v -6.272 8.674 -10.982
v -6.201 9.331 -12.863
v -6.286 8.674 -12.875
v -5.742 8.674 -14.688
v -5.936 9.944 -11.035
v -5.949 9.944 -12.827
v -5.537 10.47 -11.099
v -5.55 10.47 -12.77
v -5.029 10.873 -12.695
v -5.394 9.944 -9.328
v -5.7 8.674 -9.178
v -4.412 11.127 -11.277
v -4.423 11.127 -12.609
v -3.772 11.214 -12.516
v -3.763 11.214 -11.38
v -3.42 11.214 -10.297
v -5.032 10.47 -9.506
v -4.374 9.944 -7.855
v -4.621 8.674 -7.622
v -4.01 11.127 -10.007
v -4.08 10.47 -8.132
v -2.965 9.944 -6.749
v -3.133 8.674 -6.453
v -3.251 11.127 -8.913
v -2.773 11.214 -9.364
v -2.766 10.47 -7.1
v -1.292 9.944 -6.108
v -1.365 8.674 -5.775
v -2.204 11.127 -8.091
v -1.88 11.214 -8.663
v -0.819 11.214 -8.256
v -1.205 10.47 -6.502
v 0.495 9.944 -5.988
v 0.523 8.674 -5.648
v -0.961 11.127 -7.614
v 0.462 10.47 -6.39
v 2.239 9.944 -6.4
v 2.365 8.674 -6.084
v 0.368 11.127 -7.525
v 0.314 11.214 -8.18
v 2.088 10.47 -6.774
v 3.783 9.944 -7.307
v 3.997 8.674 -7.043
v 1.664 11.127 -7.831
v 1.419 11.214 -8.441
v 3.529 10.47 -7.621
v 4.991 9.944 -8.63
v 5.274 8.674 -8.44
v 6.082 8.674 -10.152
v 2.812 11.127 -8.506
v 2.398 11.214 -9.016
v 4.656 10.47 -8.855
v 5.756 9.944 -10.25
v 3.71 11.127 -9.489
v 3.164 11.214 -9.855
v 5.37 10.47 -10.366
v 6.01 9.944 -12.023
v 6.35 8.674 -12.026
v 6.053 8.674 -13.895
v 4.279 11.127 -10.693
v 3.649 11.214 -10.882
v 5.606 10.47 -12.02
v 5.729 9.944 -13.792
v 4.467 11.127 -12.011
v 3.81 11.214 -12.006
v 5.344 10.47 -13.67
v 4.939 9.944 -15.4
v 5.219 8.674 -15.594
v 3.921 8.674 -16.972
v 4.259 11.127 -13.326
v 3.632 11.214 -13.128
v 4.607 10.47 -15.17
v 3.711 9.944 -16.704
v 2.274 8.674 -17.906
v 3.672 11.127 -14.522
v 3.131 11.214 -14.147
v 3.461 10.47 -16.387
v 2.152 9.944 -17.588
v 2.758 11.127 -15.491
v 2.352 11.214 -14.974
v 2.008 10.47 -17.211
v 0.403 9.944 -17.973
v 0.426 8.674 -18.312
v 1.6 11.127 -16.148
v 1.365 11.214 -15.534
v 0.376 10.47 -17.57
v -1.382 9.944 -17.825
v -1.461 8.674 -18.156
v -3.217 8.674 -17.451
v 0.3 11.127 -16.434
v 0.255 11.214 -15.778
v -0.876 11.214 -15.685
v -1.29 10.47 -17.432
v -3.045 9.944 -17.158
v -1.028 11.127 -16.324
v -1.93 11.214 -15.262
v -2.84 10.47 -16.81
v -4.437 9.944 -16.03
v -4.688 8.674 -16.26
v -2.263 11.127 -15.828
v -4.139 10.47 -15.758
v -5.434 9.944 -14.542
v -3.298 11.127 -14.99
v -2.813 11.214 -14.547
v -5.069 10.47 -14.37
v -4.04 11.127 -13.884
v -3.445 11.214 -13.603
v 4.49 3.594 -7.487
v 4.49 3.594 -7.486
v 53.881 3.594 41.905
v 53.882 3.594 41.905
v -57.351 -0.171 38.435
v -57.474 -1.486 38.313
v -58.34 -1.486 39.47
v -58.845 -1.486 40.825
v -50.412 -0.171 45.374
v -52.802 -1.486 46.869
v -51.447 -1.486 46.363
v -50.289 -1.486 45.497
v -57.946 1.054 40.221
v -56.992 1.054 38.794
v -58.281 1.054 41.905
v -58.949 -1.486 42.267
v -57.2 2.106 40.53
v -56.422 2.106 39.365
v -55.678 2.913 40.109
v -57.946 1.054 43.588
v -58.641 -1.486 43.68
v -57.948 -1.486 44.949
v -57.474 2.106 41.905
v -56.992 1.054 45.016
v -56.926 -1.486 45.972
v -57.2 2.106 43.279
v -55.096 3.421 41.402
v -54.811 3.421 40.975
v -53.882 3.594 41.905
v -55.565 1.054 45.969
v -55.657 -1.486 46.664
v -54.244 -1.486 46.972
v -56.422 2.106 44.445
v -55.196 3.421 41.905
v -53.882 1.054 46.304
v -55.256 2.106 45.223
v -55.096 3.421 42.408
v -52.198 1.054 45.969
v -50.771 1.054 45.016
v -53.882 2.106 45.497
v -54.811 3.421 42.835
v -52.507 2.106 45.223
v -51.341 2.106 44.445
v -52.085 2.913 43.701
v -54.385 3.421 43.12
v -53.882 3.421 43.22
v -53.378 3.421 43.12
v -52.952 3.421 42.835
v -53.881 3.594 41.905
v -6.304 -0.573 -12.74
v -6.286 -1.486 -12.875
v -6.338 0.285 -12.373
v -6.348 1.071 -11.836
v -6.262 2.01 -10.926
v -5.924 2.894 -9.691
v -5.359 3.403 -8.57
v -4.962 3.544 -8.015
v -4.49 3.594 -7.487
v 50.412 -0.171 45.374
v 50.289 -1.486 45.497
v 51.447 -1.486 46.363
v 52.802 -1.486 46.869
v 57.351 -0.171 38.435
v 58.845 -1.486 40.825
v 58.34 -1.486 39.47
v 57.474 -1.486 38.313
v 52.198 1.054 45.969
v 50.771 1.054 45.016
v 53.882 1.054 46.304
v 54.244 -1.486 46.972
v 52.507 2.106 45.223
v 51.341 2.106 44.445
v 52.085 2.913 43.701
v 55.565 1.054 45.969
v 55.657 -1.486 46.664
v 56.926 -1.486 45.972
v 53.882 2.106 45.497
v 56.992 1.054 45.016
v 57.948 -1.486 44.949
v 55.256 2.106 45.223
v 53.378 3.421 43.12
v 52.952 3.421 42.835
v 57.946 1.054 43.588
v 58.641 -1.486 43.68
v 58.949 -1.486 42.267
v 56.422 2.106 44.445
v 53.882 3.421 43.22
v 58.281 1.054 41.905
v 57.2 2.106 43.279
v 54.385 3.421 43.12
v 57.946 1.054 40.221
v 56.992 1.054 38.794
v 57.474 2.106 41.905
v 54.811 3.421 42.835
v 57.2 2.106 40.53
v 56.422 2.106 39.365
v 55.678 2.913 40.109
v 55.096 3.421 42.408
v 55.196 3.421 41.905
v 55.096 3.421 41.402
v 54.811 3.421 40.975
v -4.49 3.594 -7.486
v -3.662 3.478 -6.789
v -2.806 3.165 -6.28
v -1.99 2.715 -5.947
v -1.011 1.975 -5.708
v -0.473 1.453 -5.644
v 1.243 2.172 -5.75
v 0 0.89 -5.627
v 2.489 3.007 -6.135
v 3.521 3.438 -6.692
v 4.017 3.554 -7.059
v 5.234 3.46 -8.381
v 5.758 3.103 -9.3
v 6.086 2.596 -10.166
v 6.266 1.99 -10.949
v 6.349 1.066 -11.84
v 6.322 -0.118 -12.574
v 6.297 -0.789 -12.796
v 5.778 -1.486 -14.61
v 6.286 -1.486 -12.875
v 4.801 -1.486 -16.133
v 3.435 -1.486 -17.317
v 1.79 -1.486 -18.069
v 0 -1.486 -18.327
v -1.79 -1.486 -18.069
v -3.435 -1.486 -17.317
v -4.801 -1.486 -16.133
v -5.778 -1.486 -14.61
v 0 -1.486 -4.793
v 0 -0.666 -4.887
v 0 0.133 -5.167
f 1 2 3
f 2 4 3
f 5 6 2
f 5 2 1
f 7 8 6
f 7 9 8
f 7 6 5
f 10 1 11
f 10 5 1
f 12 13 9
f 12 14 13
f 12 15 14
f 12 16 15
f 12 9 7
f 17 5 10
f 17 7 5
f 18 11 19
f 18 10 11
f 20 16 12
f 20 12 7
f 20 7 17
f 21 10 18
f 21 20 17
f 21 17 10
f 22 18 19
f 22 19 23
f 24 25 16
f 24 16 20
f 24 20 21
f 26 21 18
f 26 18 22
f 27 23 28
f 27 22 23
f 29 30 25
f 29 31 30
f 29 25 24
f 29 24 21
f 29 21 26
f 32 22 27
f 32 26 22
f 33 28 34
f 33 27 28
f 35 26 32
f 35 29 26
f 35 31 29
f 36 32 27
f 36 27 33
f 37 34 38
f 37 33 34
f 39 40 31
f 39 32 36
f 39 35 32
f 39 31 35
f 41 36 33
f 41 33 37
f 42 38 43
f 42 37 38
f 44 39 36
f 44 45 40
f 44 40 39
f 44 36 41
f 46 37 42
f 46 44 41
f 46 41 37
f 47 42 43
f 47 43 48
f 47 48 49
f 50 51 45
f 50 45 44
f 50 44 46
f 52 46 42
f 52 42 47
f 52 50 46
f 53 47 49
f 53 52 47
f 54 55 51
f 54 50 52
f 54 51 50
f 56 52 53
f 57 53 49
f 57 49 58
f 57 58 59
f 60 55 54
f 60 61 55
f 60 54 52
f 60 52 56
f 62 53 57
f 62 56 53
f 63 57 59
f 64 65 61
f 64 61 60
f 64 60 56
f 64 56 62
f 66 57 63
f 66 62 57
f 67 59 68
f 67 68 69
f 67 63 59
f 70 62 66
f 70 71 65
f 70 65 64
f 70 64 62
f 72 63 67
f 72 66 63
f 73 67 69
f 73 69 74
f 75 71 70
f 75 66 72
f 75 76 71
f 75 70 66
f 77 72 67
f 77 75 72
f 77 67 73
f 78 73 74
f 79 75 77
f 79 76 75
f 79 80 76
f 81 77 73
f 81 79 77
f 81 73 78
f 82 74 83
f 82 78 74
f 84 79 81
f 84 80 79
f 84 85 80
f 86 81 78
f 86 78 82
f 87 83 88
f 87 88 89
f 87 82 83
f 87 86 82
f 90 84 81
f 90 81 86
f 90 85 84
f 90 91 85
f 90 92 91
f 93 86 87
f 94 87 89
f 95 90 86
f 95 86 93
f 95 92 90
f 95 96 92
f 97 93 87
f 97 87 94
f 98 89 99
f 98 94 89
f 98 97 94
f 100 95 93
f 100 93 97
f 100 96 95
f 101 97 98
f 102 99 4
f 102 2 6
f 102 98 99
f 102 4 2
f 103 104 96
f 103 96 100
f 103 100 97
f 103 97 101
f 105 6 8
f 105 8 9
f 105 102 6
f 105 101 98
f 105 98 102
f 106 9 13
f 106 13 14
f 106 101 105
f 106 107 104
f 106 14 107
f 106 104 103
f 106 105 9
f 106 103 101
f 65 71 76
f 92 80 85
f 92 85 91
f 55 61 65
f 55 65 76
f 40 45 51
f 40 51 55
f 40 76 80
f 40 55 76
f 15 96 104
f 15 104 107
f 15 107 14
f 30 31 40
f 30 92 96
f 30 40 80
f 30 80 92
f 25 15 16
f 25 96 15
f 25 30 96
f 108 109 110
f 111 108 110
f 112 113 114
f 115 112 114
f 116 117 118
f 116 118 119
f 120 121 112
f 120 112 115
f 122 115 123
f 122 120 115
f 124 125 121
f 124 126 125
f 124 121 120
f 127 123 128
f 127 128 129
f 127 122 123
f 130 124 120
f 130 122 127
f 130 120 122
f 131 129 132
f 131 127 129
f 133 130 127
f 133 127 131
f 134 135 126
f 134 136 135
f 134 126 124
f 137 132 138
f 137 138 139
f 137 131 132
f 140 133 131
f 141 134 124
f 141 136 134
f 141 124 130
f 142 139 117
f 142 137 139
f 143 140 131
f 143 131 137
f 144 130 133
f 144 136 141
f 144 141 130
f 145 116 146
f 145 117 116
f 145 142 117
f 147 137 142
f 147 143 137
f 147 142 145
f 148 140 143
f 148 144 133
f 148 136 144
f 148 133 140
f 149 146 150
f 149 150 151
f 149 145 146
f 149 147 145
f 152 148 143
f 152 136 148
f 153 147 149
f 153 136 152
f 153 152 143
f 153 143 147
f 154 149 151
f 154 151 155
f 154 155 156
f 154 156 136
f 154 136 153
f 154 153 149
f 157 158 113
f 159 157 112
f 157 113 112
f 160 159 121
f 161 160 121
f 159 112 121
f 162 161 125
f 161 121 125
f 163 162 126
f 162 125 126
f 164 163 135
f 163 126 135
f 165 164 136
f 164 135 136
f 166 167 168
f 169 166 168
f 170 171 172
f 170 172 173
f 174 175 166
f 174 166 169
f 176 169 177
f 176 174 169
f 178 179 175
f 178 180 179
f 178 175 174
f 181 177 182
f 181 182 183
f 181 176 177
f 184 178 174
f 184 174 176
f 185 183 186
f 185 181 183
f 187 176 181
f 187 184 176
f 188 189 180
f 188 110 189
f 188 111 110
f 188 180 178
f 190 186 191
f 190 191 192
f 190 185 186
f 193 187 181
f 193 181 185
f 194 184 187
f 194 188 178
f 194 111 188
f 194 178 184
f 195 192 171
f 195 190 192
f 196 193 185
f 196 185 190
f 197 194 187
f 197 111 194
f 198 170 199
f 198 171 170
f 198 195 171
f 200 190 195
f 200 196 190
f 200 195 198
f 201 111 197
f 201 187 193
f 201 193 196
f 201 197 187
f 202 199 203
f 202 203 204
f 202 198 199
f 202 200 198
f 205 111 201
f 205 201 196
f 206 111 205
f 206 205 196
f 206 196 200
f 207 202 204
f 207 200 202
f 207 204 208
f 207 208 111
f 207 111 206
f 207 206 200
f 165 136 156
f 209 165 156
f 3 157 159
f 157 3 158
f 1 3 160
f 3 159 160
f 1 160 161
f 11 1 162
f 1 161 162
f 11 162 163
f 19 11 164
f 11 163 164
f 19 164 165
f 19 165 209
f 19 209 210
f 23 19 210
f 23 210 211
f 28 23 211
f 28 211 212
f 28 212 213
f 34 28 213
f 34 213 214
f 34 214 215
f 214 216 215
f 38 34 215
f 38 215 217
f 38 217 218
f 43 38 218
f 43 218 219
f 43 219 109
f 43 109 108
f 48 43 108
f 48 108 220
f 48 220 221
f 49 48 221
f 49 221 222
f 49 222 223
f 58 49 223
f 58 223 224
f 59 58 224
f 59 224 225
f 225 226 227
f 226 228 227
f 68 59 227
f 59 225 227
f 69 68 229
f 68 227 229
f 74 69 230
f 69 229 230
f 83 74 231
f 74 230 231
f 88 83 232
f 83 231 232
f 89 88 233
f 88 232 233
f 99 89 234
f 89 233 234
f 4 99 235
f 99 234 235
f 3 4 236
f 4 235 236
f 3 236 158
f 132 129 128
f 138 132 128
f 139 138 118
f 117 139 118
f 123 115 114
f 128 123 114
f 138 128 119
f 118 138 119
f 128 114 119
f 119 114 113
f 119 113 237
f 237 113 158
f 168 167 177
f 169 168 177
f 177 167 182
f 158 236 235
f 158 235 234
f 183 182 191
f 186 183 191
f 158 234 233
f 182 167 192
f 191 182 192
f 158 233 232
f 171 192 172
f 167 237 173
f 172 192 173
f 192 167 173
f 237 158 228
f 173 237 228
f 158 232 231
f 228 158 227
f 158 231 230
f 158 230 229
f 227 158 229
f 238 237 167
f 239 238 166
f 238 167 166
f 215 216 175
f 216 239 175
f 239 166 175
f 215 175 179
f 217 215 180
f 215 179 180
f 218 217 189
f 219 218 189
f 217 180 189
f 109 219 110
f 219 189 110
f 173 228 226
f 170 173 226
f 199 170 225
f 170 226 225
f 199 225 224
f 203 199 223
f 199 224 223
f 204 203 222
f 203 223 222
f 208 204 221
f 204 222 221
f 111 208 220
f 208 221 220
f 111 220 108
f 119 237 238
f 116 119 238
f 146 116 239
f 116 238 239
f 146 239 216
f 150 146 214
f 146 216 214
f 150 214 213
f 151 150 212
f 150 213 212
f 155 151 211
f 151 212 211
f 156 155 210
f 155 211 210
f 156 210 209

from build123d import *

# Parameters (mm, degrees)
BOSS_EXTRUDE1_DEPTH = 2.54
FILLET4_R           = 2.54
SKETCH2_R           = 3.175
BOSS_EXTRUDE2_DEPTH = 6.35
FILLET5_R           = 1.27
SCALE1_SCALE        = 2


with BuildPart() as part:
    # Sketch1 → Boss-Extrude1 (new body)
    with BuildSketch(Plane(origin=(0, 0, 0), x_dir=(1, 0, 0), z_dir=(0, 1, 0))):
        with BuildLine():
            ThreePointArc((1.796051224, -1.796051224), (2.54, 0), (1.796051224, 1.796051224))
            ThreePointArc((1.796051224, 1.796051224), (0, 2.54), (-1.796051224, 1.796051224))
            ThreePointArc((-1.796051224, 1.796051224), (-2.54, 0), (-1.796051224, -1.796051224))
            Line((-1.796051224, -1.796051224), (0, -3.592102448))
            Line((0, -3.592102448), (1.796051224, -1.796051224))
        make_face()
        with BuildLine():
            Line((28.736819587, -25.144717139), (1.796051224, 1.796051224))
            ThreePointArc((1.796051224, 1.796051224), (2.54, 0), (1.796051224, -1.796051224))
            Line((1.796051224, -1.796051224), (0, -3.592102448))
            Line((0, -3.592102448), (25.144717139, -28.736819587))
            ThreePointArc((25.144717139, -28.736819587), (28.736819587, -28.736819587), (28.736819587, -25.144717139))
        make_face()
        with BuildLine():
            ThreePointArc((-1.796051224, -1.796051224), (-2.54, 0), (-1.796051224, 1.796051224))
            Line((-1.796051224, 1.796051224), (-28.736819587, -25.144717139))
            ThreePointArc((-28.736819587, -25.144717139), (-28.736819587, -28.736819587), (-25.144717139, -28.736819587))
            Line((-25.144717139, -28.736819587), (0, -3.592102448))
            Line((0, -3.592102448), (-1.796051224, -1.796051224))
        make_face()
    extrude(amount=BOSS_EXTRUDE1_DEPTH)

    # Fillet4
    fillet4_edges = [part.edges().sort_by_distance(p)[0] for p in [
        (-28.736819587, 2.54, 28.736819587),
        (-15.266435406, 2.54, 11.674332957),
        (0, 2.54, -2.54),
        (15.266435406, 2.54, 11.674332957),
        (28.736819587, 2.54, 28.736819587),
        (12.572358569, 2.54, 16.164461018),
        (-12.572358569, 2.54, 16.164461018),
    ]]
    fillet(fillet4_edges, radius=FILLET4_R - 0.0001)  # a hair under: the kernel refuses the full size

    # Sketch2 → Boss-Extrude2 (add)
    with BuildSketch(Plane(origin=(0, 0, 0), x_dir=(1, 0, 0), z_dir=(0, 1, 0))):
        with Locations(Location((0, 0, 0), (0, 0, 171.869897646))):
            Circle(SKETCH2_R)
    extrude(amount=BOSS_EXTRUDE2_DEPTH)

    # Fillet5
    fillet5_edges = [part.edges().sort_by_distance(p)[0] for p in [
        (3.143089642, 6.35, 0.449012806),
    ]]
    fillet(fillet5_edges, radius=FILLET5_R)


with BuildPart() as part_1:
    # Scale1: scaled about (-2.1e-08, 1.486347435, 11.976765816)
    add(part.part.scale(SCALE1_SCALE).moved(Location((2.1e-08, -1.486347435, -11.976765816))))


solid = part_1.part
